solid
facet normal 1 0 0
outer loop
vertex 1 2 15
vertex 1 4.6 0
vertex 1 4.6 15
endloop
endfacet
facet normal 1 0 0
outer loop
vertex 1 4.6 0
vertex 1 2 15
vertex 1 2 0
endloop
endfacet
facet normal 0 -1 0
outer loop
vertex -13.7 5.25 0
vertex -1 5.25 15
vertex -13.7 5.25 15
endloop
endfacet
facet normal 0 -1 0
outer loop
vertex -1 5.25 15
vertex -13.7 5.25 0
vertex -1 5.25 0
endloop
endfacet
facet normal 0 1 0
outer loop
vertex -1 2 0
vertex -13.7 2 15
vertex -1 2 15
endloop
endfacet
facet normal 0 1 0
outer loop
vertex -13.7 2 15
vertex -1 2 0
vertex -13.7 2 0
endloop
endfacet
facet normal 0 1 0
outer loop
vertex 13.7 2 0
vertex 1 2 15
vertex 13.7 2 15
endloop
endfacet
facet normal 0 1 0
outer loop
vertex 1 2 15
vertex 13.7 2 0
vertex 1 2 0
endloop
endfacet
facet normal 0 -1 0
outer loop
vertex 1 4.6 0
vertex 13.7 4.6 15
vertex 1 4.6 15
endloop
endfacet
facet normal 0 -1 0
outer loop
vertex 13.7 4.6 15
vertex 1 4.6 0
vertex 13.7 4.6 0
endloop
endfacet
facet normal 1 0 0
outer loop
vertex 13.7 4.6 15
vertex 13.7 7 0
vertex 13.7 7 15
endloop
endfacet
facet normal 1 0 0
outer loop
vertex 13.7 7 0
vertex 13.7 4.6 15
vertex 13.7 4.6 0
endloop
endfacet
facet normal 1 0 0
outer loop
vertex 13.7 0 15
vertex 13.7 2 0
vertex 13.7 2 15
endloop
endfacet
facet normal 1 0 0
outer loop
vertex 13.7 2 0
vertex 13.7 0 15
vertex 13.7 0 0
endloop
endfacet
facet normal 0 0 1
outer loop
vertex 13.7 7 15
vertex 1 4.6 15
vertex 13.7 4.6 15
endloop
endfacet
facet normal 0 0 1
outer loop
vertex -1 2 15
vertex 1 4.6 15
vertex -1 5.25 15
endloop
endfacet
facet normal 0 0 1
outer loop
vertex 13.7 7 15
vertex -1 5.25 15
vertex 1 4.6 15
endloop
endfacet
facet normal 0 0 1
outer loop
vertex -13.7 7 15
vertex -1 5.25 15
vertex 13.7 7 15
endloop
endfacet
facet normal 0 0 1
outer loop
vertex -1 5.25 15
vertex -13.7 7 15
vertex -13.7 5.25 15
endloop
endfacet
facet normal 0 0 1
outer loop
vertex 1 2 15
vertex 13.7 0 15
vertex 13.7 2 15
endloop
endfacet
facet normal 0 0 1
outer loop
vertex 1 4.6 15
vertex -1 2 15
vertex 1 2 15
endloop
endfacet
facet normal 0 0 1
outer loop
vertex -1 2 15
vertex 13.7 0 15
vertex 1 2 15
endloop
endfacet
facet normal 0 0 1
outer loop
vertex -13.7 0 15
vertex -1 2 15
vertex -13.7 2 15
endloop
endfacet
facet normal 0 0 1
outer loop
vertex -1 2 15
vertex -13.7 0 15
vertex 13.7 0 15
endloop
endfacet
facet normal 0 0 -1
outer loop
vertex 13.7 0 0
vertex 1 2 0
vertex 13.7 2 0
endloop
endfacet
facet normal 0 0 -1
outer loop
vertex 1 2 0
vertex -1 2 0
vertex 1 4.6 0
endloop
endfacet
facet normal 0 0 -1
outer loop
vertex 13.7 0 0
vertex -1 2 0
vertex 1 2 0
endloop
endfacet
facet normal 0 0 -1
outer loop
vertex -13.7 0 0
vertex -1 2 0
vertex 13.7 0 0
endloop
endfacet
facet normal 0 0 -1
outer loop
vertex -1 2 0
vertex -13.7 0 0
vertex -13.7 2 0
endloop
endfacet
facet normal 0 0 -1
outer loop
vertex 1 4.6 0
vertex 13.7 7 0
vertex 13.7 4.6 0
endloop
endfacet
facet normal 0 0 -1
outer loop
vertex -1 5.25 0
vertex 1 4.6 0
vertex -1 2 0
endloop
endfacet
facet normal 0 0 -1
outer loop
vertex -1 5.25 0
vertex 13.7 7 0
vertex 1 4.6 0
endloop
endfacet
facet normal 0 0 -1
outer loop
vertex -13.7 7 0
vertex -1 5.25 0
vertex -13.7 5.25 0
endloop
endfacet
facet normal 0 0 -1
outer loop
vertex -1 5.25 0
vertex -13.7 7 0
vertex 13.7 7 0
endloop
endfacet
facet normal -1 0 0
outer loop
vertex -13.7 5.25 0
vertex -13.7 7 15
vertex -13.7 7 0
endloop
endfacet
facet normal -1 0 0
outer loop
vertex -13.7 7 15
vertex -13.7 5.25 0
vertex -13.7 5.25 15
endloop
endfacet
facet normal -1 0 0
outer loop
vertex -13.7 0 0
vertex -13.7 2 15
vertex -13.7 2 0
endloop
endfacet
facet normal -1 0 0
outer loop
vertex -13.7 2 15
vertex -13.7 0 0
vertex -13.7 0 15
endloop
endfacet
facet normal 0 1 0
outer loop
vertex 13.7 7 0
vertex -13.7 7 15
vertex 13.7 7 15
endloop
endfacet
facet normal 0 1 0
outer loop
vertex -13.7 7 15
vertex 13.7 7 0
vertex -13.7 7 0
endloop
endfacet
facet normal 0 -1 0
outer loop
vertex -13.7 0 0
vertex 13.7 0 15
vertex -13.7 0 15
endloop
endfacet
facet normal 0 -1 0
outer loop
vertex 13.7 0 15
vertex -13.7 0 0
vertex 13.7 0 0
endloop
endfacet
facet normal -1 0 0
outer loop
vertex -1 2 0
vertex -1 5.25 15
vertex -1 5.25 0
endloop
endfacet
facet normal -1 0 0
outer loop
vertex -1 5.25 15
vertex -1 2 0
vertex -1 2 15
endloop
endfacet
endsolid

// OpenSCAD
//   Horizontal clip to pinch two materials of different thicknesses
//   R. Lazure  February 2017
//
//  Keeps a common face of both materials inline
//   i.e. does not center the materials relative to one another
//
//   The HClip2 module is a modification of WilliamAAdams' Yazzonic Panel Clips
//   http://www.thingiverse.com/thing:5208
//
///// inputs ////////////////
// How long?
clip_length = 25.4;  //[15:50]
//
// Minimum wall thickness?
clip_thickness = 2;  //[1:5]
//
// height ?
clip_height = 15; //[10:50]
//
// largest gap width?
clip_gap1 = 3; //[2:10]
//
// smallest gap width?
clip_gap2 = 2; //[2:10]
//
 /* [Hidden] */

gDefaultExtent = clip_length/2;  
gGap1 = clip_gap1;
gGap2 = clip_gap2;
gDefaultThickness = clip_thickness;
gDefaultLength = clip_height;


HClip2(gDefaultLength, gDefaultExtent, gDefaultThickness, gGap1, gGap2);

module HClip2(length, extent, thickness, gap1, gap2)
// for 2 different widths
// RLazure added January 11, 2017
{
	difference()
	{       
		// full block size	
		translate([-extent-thickness/2, 0,0])
		cube(size=[thickness+extent*2, gap1+2*thickness, length]);
		
        union ()
        {
        // gap1 section
		color("red")translate([-extent-thickness/2-1, thickness,-1])
		cube(size=[thickness+extent+1, gap1+0.25, length+2]);
        
        // gap2 section
        color("blue")translate([thickness/2-1, thickness,-1])
		cube(size=[thickness+extent+1, gap2+0.6, length+2]);
        }
        }
		// divider wall along y-axis
		color("green")translate([-thickness/2, thickness-1, 0])
		cube(size=[thickness, gap1+thickness+0.25, length]);
	
}
